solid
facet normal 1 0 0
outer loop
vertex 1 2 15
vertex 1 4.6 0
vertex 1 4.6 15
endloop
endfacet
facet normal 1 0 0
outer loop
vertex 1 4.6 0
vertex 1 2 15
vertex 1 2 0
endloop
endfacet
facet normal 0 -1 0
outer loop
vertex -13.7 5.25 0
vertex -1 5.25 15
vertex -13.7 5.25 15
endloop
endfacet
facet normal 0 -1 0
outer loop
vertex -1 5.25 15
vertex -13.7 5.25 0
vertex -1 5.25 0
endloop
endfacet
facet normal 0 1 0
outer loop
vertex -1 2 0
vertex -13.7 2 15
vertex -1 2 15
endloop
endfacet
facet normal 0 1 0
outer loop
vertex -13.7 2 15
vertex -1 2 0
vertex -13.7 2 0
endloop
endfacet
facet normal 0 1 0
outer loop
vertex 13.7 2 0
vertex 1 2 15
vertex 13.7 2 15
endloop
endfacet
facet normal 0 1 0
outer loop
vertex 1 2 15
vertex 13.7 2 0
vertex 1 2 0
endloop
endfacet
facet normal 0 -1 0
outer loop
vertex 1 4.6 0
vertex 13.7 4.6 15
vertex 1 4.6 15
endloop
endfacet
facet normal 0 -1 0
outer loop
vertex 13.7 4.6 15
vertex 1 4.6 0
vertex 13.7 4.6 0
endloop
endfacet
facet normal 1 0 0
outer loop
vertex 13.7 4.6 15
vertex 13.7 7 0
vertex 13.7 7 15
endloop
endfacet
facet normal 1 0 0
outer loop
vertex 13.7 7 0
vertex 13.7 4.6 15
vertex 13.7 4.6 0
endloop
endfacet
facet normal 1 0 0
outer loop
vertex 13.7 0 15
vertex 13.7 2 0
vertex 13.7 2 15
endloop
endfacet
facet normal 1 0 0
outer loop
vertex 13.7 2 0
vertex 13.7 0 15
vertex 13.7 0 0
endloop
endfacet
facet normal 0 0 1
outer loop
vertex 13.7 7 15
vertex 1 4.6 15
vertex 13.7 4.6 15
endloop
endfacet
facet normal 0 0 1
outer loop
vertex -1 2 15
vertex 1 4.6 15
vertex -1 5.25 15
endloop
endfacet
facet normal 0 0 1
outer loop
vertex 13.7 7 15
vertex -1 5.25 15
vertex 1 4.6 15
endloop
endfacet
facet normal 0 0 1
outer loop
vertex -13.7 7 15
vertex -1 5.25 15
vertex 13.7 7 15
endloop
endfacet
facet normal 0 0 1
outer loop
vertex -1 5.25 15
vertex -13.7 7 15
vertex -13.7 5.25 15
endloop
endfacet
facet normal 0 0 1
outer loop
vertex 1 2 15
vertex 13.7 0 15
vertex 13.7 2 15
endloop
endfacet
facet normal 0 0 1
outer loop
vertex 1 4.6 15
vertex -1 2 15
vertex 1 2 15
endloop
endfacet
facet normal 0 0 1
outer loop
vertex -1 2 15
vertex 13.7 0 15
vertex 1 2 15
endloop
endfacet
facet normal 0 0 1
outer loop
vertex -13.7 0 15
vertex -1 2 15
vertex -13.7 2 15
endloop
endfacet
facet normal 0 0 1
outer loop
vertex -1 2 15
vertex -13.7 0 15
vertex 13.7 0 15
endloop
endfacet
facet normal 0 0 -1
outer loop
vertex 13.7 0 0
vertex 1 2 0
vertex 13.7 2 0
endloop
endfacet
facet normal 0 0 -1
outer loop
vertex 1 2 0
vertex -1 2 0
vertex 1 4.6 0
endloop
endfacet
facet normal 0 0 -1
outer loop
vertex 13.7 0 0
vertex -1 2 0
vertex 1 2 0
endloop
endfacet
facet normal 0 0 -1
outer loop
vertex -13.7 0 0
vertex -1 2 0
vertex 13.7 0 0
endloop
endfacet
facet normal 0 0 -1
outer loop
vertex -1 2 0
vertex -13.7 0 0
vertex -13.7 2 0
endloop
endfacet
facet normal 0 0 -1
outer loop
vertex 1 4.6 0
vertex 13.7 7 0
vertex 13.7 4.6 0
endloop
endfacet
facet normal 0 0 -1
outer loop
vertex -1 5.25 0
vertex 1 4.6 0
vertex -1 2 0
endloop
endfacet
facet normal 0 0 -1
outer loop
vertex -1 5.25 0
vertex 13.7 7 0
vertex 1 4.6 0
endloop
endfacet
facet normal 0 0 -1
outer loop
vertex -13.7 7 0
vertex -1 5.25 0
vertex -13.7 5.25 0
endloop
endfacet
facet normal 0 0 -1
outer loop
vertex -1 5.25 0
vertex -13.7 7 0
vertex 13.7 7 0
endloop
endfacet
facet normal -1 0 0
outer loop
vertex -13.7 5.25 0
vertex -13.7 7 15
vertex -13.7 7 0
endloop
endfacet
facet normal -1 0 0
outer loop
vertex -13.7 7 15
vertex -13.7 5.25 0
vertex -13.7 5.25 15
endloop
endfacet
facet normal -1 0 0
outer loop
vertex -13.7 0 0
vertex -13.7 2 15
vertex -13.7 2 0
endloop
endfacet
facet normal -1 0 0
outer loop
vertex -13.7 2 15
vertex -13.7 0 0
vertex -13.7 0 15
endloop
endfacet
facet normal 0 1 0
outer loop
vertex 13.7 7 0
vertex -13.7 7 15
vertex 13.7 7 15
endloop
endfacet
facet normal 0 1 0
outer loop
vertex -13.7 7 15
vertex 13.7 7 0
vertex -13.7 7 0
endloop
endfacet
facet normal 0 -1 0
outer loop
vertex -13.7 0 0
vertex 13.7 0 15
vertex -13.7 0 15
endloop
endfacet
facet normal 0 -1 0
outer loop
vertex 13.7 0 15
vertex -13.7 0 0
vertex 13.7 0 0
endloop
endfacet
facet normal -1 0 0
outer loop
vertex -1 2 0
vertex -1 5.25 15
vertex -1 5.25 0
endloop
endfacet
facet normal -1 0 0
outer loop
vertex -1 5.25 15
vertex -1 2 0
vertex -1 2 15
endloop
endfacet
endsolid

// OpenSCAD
//   Horizontal clip to pinch two materials of different thicknesses
//   R. Lazure  February 2017
//
//  Keeps a common face of both materials inline
//   i.e. does not center the materials relative to one another
//
//   The HClip2 module is a modification of WilliamAAdams' Yazzonic Panel Clips
//   http://www.thingiverse.com/thing:5208
//
///// inputs ////////////////
// How long?
clip_length = 25.4;  //[15:50]
//
// Minimum wall thickness?
clip_thickness = 2;  //[1:5]
//
// height ?
clip_height = 15; //[10:50]
//
// largest gap width?
clip_gap1 = 3; //[2:10]
//
// smallest gap width?
clip_gap2 = 2; //[2:10]
//
 /* [Hidden] */

gDefaultExtent = clip_length/2;  
gGap1 = clip_gap1;
gGap2 = clip_gap2;
gDefaultThickness = clip_thickness;
gDefaultLength = clip_height;


HClip2(gDefaultLength, gDefaultExtent, gDefaultThickness, gGap1, gGap2);

module HClip2(length, extent, thickness, gap1, gap2)
// for 2 different widths
// RLazure added January 11, 2017
{
	difference()
	{       
		// full block size	
		translate([-extent-thickness/2, 0,0])
		cube(size=[thickness+extent*2, gap1+2*thickness, length]);
		
        union ()
        {
        // gap1 section
		color("red")translate([-extent-thickness/2-1, thickness,-1])
		cube(size=[thickness+extent+1, gap1+0.25, length+2]);
        
        // gap2 section
        color("blue")translate([thickness/2-1, thickness,-1])
		cube(size=[thickness+extent+1, gap2+0.6, length+2]);
        }
        }
		// divider wall along y-axis
		color("green")translate([-thickness/2, thickness-1, 0])
		cube(size=[thickness, gap1+thickness+0.25, length]);
	
}
